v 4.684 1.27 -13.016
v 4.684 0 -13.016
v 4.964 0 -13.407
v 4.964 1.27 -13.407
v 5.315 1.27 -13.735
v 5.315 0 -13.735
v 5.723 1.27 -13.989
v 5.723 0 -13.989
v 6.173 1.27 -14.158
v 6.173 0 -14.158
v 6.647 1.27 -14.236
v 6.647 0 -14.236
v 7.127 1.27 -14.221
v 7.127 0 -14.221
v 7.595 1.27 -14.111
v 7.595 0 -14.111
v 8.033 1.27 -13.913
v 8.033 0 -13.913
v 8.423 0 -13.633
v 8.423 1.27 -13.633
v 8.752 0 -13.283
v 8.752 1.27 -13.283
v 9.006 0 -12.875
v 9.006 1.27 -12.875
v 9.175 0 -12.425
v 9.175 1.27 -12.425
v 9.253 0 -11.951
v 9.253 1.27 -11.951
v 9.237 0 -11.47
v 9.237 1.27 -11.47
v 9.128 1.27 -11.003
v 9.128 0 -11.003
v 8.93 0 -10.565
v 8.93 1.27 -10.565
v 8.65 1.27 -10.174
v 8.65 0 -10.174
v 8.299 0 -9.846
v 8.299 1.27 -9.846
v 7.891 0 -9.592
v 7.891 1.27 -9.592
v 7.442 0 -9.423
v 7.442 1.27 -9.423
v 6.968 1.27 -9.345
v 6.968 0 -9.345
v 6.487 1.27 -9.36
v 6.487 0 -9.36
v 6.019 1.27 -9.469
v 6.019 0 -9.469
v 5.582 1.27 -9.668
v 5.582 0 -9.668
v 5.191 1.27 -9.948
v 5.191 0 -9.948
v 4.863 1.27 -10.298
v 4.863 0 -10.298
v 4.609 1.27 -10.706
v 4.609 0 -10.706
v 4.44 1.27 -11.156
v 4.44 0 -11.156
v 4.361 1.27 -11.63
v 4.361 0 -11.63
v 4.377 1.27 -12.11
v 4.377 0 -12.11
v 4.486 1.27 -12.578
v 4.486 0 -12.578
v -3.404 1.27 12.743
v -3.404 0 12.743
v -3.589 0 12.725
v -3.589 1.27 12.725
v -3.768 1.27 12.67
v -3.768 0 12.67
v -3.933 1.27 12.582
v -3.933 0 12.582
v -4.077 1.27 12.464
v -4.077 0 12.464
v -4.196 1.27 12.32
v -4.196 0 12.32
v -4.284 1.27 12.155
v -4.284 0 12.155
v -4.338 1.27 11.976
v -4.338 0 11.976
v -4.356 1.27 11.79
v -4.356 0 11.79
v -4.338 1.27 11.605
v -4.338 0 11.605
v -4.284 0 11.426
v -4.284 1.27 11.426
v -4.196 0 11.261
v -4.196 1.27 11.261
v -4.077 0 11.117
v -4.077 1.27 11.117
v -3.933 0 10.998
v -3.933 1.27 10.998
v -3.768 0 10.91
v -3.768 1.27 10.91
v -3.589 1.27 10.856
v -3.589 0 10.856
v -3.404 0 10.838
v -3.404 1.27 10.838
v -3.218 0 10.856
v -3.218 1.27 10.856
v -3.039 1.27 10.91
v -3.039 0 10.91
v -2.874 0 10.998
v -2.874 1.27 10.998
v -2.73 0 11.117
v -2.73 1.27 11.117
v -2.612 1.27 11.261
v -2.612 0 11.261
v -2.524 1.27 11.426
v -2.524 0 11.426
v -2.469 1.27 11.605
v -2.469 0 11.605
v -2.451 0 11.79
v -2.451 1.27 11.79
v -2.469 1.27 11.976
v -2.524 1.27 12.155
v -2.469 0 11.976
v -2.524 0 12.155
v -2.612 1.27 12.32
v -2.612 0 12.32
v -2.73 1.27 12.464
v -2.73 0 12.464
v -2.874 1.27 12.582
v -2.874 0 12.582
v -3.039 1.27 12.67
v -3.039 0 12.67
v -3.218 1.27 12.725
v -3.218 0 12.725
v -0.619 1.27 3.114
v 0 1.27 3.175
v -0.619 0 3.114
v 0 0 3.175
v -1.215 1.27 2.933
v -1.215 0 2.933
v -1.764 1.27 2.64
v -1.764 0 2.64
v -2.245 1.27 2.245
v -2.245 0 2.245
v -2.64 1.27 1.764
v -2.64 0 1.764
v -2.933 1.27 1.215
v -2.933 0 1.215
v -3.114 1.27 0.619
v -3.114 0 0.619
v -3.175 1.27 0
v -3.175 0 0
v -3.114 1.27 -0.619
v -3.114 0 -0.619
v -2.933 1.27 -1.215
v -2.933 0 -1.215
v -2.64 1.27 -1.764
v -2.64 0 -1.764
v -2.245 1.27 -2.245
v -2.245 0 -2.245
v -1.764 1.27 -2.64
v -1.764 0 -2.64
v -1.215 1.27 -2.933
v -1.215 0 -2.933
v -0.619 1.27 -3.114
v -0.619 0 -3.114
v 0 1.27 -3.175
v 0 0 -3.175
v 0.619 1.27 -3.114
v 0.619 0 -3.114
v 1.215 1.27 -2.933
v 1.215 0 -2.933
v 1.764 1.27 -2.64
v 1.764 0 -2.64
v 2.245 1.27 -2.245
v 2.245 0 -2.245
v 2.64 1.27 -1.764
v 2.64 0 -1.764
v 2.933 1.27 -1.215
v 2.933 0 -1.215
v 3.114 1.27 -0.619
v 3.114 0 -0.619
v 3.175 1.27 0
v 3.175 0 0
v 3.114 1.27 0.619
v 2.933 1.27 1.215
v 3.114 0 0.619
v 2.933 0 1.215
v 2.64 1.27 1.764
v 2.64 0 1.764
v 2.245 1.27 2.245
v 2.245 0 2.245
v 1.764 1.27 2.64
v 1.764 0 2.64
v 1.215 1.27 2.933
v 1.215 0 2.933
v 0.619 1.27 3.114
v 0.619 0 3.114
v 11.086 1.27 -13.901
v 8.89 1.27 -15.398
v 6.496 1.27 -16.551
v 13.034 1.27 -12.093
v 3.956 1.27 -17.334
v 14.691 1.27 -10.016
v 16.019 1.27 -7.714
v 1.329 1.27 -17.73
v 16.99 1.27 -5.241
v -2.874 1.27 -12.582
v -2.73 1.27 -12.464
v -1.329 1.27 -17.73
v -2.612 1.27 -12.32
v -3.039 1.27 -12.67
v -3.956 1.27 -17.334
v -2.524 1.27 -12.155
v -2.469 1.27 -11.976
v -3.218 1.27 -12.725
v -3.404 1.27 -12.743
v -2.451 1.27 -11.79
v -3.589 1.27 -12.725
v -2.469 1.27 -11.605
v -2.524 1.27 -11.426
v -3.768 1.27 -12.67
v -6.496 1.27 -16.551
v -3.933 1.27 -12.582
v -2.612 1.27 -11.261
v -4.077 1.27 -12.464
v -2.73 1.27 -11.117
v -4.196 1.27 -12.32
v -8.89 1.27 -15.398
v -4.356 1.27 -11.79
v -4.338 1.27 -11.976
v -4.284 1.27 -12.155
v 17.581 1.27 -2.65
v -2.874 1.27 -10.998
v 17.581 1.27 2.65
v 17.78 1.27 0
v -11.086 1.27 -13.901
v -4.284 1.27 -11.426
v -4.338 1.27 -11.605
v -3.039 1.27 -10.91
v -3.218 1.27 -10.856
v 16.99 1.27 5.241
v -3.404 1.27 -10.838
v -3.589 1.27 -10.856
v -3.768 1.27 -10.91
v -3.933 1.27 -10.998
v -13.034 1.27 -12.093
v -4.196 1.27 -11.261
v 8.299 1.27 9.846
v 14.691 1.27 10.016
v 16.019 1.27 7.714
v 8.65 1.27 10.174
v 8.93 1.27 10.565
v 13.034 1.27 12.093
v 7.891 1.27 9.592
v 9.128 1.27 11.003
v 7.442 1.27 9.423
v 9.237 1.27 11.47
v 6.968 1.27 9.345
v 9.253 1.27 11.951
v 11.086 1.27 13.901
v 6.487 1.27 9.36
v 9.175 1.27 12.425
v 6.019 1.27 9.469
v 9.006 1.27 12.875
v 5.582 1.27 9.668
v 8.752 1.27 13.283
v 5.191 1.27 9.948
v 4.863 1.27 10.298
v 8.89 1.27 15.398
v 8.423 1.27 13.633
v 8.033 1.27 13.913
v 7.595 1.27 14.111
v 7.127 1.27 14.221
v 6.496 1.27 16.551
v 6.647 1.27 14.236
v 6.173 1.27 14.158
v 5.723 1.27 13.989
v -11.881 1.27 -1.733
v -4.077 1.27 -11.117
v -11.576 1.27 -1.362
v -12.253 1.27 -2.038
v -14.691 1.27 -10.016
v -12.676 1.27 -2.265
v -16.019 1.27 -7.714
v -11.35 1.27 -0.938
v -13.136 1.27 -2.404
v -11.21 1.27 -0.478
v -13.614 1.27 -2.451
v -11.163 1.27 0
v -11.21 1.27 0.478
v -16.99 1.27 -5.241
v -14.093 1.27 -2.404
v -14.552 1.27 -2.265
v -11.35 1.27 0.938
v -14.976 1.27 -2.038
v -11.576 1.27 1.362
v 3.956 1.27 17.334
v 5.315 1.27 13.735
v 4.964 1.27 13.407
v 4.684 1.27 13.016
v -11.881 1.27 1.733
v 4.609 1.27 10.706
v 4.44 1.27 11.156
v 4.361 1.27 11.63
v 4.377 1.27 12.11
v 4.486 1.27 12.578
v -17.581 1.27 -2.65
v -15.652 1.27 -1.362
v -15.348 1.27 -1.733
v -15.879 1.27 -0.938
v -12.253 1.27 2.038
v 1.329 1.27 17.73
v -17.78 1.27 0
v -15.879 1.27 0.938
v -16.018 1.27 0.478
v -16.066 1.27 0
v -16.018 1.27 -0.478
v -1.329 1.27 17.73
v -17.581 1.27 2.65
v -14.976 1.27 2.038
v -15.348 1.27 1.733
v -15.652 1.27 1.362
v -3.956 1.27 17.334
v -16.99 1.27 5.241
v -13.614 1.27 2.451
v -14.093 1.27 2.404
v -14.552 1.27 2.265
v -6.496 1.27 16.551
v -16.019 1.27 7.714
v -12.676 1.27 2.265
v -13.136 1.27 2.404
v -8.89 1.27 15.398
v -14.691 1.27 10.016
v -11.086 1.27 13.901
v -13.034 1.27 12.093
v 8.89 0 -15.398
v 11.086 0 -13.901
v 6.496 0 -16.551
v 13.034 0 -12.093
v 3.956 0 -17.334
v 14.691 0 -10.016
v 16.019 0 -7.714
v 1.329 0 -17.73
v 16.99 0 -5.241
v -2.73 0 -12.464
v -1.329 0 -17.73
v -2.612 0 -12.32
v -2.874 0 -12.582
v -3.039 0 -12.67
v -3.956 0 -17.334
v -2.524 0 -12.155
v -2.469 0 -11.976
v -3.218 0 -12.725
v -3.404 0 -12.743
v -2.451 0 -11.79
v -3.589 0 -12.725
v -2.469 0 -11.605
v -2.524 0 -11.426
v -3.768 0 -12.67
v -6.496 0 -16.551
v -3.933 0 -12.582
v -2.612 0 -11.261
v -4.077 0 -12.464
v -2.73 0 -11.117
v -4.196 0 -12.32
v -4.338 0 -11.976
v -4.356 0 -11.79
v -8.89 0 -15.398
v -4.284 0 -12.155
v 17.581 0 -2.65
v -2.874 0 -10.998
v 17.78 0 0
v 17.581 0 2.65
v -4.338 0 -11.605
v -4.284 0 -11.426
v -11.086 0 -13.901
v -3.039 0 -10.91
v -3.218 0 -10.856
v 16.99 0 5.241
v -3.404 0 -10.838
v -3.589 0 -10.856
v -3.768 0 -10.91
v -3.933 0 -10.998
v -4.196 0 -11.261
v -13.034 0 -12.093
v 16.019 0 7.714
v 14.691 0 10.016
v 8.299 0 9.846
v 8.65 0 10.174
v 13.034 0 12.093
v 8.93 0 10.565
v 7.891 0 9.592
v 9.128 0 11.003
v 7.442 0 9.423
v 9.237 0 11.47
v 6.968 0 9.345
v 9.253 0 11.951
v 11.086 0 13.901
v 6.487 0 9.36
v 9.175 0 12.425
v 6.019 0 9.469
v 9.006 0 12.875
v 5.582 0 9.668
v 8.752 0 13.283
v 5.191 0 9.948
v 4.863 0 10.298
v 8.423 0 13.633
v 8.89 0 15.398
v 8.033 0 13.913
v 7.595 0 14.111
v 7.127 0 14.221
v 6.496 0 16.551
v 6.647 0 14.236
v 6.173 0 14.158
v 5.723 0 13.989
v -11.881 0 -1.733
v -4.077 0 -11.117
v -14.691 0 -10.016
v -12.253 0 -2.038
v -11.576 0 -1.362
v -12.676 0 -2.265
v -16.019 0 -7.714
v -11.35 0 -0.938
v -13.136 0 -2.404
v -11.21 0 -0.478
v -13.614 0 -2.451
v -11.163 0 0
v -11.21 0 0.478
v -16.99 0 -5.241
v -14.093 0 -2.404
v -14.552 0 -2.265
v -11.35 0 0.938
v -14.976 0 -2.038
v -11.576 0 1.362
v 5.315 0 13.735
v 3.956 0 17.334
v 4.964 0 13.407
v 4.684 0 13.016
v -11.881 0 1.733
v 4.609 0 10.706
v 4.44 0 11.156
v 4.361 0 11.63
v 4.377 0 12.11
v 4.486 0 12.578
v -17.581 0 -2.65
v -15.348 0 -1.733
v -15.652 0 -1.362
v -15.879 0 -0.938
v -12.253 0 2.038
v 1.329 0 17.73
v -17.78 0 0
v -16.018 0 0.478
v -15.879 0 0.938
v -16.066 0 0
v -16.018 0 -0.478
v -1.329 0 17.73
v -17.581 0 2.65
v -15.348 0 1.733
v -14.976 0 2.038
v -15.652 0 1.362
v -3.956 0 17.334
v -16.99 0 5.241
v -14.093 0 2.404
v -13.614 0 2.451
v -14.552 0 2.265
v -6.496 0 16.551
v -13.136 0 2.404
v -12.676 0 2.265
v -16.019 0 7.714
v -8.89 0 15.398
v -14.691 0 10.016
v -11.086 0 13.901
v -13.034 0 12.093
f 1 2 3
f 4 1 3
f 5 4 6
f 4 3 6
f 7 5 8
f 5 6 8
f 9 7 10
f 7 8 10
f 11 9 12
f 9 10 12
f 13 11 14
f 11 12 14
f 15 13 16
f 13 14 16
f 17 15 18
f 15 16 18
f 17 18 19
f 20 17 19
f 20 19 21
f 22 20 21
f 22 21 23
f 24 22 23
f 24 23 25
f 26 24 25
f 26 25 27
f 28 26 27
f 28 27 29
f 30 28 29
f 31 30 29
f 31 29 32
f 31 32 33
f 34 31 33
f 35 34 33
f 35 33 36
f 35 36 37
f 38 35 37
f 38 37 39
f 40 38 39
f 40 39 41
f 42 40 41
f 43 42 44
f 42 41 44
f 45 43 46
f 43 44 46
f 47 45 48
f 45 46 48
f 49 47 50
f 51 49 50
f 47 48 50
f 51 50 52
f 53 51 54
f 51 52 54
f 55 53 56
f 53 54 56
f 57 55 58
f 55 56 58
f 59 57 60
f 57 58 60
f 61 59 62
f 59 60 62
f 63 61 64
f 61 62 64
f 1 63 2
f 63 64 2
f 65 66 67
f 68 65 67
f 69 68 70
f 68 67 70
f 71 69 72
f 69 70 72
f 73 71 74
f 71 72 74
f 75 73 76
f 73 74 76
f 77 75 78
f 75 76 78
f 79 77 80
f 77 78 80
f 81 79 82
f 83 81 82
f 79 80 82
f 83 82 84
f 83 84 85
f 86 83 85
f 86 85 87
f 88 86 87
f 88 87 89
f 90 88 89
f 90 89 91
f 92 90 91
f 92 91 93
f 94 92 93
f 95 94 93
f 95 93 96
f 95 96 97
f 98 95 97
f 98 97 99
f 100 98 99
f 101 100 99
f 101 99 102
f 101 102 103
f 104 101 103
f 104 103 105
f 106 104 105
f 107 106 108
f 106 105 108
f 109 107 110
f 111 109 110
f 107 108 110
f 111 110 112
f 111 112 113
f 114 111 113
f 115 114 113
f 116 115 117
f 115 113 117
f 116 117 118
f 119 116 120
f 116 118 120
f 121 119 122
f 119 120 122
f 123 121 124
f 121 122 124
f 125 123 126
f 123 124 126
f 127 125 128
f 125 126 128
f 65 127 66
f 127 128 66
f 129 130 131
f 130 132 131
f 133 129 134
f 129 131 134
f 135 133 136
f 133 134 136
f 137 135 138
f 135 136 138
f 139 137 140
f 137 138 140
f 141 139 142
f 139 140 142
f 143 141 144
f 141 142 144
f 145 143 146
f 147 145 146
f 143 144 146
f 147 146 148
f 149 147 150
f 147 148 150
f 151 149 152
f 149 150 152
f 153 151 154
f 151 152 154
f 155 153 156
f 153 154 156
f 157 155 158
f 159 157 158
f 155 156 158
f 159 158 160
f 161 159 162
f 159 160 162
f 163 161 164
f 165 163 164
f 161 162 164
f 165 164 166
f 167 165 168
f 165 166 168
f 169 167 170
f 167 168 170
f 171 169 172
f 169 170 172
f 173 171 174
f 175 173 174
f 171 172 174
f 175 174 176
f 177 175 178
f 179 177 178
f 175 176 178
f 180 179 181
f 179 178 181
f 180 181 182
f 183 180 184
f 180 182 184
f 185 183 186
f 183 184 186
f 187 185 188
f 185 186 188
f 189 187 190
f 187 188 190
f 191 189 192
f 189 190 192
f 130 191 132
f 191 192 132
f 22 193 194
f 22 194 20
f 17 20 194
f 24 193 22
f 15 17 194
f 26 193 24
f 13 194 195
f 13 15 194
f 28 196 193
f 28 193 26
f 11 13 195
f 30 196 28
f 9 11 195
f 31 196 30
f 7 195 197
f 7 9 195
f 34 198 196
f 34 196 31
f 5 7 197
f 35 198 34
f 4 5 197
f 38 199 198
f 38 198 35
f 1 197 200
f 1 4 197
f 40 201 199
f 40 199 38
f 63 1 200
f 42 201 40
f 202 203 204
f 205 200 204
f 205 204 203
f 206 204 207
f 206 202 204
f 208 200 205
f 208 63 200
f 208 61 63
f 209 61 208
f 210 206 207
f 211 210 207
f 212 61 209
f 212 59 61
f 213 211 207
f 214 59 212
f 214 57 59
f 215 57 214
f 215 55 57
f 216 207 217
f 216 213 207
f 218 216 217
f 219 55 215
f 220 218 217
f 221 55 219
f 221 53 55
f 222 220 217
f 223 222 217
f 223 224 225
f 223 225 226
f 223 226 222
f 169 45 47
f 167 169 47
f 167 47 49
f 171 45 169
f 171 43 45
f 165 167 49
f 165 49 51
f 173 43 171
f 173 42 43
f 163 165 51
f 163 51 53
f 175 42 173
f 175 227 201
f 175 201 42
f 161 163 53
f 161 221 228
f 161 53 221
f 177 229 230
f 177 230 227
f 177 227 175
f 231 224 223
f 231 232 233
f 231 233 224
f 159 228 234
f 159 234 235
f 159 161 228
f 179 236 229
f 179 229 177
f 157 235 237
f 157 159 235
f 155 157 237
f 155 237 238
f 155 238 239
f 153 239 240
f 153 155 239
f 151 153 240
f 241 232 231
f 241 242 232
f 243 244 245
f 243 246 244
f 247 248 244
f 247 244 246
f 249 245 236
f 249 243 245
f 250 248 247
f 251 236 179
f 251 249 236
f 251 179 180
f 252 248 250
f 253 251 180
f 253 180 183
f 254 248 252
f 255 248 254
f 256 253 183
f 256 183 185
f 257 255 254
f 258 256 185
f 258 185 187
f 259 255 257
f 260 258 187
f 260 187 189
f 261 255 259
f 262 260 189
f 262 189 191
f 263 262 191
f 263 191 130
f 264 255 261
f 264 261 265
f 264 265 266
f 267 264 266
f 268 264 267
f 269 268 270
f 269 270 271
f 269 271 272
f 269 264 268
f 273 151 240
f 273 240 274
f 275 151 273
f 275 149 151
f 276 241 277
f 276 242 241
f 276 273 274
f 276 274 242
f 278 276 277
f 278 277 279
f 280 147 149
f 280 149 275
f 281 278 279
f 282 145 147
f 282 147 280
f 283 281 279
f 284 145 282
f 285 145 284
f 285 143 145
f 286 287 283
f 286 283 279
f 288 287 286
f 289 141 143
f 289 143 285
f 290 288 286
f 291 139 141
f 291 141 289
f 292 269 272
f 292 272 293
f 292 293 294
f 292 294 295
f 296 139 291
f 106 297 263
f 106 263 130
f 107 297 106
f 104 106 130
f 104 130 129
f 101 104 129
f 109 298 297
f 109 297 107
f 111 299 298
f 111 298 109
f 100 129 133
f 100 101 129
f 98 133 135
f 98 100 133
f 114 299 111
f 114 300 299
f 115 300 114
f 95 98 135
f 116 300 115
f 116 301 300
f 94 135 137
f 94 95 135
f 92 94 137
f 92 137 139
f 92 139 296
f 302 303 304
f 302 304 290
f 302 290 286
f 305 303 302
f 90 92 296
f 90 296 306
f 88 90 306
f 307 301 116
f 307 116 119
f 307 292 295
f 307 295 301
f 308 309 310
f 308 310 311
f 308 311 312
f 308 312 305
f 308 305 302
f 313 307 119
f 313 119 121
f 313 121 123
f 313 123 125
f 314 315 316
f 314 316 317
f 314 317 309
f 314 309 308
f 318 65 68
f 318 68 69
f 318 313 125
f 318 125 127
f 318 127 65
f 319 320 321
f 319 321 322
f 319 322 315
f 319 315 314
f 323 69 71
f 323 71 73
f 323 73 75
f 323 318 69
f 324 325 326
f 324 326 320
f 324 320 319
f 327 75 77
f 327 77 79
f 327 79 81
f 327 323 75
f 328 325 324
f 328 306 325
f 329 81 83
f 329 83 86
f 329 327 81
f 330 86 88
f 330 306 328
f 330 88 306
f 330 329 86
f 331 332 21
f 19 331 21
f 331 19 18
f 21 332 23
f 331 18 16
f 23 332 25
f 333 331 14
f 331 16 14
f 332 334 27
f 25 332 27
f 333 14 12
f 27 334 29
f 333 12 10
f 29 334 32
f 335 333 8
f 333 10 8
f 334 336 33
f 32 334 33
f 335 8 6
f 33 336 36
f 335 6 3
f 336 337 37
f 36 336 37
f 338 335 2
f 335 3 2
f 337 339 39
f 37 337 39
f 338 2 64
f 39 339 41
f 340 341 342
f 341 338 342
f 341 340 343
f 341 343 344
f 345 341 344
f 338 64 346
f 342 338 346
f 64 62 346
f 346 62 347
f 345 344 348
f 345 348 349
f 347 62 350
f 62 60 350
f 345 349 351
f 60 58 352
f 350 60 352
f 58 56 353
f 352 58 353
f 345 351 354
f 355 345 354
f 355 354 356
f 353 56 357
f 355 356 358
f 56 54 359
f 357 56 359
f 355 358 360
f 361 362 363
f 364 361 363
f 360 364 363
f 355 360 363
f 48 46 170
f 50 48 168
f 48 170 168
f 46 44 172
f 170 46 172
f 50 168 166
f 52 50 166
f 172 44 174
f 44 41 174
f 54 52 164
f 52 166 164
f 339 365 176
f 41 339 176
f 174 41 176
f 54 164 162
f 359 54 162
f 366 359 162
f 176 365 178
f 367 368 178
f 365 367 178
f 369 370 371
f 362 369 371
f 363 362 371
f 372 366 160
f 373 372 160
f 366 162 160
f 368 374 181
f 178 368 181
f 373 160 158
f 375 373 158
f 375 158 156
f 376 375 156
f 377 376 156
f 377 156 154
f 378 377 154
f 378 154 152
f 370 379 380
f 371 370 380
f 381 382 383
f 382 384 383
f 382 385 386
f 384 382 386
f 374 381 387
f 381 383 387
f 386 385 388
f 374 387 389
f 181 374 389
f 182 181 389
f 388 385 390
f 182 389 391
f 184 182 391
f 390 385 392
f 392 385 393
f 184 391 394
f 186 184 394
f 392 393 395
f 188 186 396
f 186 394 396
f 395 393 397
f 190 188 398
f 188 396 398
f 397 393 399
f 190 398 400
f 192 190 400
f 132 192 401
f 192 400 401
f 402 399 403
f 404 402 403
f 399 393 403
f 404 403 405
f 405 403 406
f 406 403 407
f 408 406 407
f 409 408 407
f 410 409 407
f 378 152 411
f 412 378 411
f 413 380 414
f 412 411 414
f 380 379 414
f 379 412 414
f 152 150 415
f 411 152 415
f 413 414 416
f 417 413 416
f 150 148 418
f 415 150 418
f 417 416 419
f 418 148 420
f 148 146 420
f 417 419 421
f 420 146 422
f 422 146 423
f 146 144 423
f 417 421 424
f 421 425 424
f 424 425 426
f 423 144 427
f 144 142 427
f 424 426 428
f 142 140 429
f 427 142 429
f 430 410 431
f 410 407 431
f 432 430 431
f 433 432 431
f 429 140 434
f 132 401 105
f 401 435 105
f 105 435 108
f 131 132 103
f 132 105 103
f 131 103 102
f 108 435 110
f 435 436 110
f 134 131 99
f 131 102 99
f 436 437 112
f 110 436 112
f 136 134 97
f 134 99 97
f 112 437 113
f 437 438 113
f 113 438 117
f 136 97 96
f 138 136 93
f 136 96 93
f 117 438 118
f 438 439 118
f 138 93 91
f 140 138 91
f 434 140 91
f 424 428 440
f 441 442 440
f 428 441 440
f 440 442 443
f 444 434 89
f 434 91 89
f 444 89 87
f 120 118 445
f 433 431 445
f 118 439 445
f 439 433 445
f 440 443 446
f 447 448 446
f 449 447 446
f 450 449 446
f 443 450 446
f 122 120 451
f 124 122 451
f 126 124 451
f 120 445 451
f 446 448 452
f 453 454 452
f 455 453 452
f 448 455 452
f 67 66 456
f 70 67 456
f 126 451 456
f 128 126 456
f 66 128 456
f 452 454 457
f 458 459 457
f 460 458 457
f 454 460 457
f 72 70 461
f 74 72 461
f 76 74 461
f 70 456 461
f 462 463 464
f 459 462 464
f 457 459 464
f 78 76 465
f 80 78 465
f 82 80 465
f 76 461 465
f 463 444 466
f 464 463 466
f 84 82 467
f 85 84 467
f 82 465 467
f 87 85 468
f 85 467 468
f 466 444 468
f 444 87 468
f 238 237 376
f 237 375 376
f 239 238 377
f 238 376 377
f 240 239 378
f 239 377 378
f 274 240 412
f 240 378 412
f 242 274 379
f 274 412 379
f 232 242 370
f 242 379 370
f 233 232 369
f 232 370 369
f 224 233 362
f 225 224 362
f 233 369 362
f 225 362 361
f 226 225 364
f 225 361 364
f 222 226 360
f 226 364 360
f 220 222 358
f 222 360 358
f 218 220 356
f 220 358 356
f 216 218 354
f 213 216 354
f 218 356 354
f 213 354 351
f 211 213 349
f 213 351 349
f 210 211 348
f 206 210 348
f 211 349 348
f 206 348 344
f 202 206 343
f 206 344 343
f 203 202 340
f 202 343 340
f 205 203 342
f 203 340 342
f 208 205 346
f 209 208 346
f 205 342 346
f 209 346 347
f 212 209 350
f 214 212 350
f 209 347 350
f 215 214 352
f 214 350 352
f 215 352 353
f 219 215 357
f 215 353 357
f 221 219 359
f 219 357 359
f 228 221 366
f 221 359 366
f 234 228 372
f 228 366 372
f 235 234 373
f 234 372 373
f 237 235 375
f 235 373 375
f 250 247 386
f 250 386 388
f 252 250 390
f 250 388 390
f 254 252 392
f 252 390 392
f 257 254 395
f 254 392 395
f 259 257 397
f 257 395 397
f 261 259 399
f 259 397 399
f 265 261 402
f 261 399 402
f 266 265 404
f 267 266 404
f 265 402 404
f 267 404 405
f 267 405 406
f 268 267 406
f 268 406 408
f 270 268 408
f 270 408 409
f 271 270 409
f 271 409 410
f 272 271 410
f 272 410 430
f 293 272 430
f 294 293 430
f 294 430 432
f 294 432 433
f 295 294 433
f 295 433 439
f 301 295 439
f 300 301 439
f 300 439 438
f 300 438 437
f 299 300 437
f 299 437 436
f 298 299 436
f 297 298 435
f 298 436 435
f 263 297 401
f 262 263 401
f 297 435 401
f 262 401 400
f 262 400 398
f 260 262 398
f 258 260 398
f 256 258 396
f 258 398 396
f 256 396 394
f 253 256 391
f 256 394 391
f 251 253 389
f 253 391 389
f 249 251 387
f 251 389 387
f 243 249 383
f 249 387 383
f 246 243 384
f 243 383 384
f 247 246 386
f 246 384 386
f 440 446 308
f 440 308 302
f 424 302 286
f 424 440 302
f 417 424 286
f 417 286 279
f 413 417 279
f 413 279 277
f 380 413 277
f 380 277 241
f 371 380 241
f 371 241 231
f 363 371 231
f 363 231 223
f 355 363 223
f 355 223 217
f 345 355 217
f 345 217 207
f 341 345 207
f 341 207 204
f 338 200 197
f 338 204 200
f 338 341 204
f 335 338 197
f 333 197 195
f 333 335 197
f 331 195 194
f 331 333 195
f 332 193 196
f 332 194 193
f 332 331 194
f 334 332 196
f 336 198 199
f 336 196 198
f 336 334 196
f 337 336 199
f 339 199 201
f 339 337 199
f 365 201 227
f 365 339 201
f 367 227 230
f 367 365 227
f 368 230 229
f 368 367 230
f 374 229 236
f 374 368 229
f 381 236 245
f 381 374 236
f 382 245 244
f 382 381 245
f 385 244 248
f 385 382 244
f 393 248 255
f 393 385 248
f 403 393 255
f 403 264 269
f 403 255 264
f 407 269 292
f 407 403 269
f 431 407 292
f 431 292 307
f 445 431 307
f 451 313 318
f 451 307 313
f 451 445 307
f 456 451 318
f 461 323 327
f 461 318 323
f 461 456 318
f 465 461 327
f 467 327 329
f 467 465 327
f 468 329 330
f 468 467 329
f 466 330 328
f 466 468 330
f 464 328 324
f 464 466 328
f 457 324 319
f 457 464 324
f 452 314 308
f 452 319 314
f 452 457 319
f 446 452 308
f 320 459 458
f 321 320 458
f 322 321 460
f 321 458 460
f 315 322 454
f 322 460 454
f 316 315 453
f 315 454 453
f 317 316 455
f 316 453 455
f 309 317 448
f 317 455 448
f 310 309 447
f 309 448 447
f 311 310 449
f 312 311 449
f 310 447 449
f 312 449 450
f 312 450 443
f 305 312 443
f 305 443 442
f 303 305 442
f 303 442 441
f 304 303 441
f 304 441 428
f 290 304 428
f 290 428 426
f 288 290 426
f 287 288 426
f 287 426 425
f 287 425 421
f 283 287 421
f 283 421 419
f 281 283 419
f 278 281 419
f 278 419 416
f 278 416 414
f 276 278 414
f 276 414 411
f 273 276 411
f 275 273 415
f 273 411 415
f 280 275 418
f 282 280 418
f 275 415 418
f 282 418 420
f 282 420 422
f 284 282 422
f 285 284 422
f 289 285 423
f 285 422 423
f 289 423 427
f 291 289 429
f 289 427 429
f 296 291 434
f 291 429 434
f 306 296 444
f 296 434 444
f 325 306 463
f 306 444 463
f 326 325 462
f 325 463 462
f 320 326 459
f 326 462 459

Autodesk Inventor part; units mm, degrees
ref_plane "YZ Plane" through (0, 0, 0) normal (1, 0, 0) x (0, 1, 0)
ref_plane "XZ Plane" through (0, 0, 0) normal (0, 1, 0) x (-1, 0, 0)
ref_plane "XY Plane" through (0, 0, 0) normal (0, 0, 1) x (1, 0, 0)
sketch "Sketch1" plane through (0, 0, 0) normal (0, 1, 0) x (-1, 0, 0)
  circle A0 centre (0, 0) radius 17.78
  dimension "d0" = 35.56
extrude "Extrusion1" add sketch "Sketch1" along normal blind 1.27
sketch "Sketch2" plane through (0, 1.27, 0) normal (0, 1, 0) x (1, 0, 0)
  circle A0 centre (0, 0) radius 17.78 projected
hole "Hole1" at (0, 1.27, 0) direction (0, -1, 0) diameter 6.35 end through all
sketch "Sketch3" plane through (0, 1.27, 0) normal (0, 1, 0) x (1, 0, 0)
  line L0 (0, 0) -> (-13.6144, 0)
  dimension "d10" = 13.6144
hole "Hole2" at (-13.6144, 1.27, 0) direction (0, -1, 0) diameter 4.9022 end through all
pattern_circular "Circular Pattern1" count 3 over 360 about axis through (0, -49.0355, 0) along (0, 1, 0) of "Hole2"
sketch "Sketch5" plane through (0, 1.27, 0) normal (0, 1, 0) x (1, 0, 0)
  circle A0 centre (-13.6144, 0) radius 2.4511 projected
  circle A1 centre (6.8072, 11.7904) radius 2.4511 projected
  line L0 (-13.6144, 0) -> (6.8072, 11.7904)
  circle A2 centre (6.8072, -11.7904) radius 2.4511 projected
  line L1 (6.8072, 11.7904) -> (6.8072, -11.7904)
  line L2 (6.8072, -11.7904) -> (-13.6144, 0)
  line L3 (-13.6144, 0) -> (-13.6144, -11.7904)
  line L4 (-13.6144, -11.7904) -> (6.8072, -11.7904)
  line L5 (-13.6144, 0) -> (-13.6144, 11.7904)
  line L6 (-13.6144, 11.7904) -> (6.8072, 11.7904)
  circle A3 centre (-3.4036, 11.7904) radius 0.635
  circle A4 centre (-3.4036, -11.7904) radius 0.635
  point P0 (0, 0)
  dimension "d28" = 1.27
hole "Hole4" at (-3.4036, 1.27, 11.7904) at (-3.4036, 1.27, -11.7904) direction (0, -1, 0) diameter 1.905 depth 6.35 tip angle 118
properties part number "buffer" material "PBT Plastic"
